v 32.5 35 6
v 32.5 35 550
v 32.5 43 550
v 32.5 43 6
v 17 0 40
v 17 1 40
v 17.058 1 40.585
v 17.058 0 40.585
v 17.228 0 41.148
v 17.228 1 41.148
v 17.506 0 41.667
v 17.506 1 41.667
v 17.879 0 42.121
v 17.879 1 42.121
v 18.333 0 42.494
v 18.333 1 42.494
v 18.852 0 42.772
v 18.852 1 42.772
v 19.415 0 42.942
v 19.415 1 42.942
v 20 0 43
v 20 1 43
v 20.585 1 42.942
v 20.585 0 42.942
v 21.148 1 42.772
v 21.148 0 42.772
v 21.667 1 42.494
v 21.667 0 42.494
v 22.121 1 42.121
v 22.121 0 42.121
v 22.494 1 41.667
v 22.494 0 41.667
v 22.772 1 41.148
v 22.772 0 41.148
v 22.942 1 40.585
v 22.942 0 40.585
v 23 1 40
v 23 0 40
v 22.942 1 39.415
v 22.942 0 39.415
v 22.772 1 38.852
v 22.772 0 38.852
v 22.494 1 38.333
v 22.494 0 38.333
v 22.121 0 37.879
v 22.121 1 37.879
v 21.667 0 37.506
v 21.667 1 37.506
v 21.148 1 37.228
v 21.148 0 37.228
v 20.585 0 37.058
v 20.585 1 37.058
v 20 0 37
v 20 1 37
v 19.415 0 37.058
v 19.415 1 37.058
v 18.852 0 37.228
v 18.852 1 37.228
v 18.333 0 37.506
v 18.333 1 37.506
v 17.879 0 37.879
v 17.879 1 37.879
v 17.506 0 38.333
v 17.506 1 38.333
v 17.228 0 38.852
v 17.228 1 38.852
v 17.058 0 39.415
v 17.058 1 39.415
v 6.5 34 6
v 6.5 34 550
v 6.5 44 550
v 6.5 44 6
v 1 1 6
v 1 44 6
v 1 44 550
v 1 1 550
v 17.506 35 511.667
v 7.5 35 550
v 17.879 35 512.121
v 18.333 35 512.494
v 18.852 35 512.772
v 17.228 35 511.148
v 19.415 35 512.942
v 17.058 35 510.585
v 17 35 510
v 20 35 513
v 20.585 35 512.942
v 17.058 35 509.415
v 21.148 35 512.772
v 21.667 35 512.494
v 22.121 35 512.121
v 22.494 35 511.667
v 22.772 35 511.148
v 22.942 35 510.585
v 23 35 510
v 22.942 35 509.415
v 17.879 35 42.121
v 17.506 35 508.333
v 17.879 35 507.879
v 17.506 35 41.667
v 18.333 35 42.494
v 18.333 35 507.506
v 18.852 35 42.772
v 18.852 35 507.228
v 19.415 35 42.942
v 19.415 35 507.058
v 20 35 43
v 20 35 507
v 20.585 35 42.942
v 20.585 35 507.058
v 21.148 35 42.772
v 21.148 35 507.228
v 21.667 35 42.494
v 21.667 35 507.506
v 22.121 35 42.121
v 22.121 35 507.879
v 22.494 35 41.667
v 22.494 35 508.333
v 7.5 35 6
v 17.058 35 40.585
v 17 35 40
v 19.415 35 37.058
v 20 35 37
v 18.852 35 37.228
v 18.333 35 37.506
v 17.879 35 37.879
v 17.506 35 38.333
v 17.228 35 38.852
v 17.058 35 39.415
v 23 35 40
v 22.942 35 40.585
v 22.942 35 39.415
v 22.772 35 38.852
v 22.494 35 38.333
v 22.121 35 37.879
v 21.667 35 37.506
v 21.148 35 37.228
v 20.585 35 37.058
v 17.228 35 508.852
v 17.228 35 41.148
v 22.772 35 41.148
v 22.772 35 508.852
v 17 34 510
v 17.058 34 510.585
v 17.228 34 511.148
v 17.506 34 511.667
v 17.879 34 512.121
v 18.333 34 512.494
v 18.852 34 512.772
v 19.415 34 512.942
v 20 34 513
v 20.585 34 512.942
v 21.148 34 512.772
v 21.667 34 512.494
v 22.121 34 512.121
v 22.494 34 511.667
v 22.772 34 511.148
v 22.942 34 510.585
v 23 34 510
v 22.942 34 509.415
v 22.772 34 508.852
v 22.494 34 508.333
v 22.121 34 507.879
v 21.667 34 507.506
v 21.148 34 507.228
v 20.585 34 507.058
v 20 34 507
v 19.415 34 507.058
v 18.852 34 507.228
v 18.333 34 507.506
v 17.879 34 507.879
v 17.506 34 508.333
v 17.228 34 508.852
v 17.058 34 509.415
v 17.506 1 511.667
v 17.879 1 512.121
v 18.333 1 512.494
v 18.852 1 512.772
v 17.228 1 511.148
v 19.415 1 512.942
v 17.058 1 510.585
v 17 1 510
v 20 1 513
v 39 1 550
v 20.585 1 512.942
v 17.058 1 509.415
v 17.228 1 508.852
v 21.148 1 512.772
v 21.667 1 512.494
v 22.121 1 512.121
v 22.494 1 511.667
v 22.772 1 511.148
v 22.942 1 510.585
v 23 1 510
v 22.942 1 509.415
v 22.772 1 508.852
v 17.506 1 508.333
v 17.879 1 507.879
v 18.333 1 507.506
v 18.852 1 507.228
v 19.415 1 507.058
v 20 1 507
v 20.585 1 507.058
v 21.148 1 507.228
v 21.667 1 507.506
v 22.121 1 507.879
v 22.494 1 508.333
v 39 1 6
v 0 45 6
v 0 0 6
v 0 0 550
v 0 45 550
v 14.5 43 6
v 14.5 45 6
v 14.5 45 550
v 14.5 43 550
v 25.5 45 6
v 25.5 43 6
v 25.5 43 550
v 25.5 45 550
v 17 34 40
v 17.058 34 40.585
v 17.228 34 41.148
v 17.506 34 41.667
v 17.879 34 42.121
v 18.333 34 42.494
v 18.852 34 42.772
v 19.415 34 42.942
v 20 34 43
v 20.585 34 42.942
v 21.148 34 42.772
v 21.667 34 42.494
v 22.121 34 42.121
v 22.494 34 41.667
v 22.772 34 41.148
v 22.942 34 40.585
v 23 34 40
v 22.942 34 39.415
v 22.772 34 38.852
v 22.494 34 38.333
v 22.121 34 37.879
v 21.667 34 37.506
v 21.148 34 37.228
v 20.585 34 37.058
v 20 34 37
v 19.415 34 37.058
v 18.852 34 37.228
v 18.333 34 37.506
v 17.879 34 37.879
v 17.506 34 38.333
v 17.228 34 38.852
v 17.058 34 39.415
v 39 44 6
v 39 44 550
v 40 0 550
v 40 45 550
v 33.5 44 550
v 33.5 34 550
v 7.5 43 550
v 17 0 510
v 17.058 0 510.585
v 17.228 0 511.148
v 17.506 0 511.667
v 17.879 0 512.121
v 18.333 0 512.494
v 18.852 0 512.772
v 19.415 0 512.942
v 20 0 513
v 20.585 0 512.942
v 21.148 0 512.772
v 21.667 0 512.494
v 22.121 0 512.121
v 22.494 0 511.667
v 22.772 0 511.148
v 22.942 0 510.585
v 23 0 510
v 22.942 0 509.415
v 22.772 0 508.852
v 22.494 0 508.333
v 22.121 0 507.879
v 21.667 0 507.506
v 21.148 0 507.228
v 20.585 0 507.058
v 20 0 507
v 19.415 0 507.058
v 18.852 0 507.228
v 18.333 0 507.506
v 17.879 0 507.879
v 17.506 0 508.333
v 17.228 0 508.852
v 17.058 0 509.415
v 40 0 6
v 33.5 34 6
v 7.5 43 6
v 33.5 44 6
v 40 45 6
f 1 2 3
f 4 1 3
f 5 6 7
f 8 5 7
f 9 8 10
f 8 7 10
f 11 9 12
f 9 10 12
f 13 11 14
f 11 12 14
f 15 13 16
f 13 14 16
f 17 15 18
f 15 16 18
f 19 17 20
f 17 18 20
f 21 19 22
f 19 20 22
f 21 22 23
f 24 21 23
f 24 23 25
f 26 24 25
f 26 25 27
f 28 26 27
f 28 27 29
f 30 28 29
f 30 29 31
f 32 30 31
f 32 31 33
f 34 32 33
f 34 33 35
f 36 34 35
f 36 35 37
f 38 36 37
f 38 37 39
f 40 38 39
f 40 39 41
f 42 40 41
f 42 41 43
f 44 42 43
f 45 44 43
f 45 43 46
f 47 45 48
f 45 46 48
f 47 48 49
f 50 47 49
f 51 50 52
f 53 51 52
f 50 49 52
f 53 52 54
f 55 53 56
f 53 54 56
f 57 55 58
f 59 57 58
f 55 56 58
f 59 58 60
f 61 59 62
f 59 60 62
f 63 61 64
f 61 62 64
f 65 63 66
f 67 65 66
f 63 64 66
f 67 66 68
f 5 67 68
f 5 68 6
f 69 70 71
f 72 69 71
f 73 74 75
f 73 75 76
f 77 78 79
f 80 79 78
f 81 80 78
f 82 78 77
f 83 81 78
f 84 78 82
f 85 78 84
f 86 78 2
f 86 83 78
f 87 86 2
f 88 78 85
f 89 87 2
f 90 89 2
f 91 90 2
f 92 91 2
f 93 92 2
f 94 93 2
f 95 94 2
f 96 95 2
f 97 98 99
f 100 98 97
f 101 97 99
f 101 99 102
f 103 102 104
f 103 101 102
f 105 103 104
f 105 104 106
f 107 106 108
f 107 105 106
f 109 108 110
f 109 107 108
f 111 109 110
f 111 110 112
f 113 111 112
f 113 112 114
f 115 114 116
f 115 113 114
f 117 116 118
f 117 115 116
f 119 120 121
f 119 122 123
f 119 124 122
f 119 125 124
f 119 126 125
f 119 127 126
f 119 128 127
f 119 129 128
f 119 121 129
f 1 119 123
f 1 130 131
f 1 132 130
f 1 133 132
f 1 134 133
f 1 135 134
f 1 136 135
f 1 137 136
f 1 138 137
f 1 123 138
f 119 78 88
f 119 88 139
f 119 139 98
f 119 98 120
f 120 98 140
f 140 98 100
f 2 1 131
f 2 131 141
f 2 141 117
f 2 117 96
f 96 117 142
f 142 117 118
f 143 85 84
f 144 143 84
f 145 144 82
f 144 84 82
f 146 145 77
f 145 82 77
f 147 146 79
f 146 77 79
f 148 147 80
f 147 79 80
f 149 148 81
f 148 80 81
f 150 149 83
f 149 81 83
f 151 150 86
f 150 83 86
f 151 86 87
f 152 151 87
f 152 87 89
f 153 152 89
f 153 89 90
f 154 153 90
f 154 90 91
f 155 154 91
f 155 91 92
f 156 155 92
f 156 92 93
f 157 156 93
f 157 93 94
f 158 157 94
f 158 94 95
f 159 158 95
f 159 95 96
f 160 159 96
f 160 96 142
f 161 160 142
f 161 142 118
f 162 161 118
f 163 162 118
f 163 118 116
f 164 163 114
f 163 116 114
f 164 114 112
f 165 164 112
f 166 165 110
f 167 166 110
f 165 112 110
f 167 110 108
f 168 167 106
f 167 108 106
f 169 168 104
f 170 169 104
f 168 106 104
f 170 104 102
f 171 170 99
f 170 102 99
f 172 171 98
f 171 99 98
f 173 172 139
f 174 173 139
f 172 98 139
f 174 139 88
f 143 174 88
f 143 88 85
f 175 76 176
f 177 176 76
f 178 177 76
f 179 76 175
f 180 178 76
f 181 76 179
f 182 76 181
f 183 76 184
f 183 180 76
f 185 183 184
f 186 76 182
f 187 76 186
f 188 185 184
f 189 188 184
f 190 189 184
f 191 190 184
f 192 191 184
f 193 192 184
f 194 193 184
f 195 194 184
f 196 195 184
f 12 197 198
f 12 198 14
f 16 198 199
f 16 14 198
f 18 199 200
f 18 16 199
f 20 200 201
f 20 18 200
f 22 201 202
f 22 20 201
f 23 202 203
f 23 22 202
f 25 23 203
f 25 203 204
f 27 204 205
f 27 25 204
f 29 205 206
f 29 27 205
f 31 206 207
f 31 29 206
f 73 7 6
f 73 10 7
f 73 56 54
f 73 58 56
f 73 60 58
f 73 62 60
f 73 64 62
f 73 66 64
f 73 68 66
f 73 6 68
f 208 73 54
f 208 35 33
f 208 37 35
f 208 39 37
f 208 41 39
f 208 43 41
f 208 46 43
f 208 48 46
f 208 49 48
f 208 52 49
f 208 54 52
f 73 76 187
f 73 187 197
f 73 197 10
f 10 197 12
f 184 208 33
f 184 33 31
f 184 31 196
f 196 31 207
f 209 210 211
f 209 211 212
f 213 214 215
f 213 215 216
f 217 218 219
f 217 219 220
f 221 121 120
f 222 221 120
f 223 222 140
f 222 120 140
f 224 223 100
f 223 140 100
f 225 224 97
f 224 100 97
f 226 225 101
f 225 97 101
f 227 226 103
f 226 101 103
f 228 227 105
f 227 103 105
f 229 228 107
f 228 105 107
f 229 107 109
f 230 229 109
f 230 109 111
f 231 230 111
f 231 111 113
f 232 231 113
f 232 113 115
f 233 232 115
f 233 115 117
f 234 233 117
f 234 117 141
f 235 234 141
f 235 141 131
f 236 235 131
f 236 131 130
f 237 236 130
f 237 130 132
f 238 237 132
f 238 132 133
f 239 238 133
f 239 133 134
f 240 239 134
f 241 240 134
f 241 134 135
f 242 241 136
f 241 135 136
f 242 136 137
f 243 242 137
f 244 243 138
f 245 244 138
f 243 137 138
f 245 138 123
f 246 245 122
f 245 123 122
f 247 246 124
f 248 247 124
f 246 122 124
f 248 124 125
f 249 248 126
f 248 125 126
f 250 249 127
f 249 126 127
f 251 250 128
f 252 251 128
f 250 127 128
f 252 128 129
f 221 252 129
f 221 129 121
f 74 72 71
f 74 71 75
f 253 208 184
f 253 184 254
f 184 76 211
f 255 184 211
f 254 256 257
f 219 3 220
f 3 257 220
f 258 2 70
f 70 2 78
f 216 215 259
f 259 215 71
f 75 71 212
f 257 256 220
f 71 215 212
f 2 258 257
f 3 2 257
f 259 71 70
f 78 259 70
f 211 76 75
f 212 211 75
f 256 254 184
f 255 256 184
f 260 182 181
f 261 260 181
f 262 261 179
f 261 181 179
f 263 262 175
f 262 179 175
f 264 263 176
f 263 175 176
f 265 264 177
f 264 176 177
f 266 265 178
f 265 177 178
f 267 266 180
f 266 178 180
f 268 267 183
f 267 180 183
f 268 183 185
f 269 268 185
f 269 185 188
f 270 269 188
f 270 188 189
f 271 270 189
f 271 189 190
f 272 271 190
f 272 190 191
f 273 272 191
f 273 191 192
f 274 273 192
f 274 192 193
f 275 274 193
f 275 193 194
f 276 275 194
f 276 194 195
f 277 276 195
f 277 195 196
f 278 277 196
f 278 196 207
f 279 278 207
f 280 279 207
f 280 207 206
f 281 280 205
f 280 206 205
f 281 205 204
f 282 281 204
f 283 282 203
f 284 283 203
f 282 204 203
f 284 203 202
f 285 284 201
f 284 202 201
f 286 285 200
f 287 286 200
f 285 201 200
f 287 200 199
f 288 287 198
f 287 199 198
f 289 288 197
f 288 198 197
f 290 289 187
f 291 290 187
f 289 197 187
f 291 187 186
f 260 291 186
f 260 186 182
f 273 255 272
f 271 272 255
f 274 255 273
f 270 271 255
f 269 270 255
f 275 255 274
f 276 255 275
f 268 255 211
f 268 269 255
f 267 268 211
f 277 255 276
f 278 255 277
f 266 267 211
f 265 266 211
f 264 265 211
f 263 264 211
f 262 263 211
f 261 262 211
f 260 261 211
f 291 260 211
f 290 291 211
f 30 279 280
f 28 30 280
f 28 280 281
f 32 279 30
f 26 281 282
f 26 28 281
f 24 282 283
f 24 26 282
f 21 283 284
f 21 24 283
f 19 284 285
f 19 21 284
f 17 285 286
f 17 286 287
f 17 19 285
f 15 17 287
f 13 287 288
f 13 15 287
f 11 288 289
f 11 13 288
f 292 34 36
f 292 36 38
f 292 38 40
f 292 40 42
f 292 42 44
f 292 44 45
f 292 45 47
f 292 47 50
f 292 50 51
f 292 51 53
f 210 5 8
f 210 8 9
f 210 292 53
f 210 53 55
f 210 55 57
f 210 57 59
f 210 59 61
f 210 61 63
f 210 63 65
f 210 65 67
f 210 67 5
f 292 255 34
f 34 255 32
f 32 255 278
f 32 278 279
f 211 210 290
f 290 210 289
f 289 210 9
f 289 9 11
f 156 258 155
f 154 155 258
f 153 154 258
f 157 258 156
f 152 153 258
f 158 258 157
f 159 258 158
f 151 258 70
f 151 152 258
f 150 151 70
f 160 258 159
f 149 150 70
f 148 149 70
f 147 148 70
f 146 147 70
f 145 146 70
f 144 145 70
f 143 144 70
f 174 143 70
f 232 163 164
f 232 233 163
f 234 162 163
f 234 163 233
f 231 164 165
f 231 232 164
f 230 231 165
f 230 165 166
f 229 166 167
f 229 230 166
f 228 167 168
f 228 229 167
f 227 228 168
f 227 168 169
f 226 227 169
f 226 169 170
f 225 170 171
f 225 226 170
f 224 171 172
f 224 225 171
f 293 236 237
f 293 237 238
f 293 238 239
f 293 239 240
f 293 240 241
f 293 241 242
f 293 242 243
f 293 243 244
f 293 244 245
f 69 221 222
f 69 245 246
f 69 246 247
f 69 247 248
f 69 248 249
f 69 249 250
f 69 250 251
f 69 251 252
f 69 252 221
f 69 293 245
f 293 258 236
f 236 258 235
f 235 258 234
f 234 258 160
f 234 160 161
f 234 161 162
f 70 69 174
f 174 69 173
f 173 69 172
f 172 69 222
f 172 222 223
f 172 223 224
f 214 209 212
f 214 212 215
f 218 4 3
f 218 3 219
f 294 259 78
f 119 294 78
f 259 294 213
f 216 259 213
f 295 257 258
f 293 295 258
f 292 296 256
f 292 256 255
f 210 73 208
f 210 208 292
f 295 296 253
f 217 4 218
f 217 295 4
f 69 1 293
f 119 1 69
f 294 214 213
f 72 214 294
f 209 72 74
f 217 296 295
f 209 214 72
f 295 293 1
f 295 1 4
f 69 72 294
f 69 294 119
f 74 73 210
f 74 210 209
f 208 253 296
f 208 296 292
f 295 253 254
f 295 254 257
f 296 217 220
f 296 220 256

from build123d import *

# Parameters (mm, degrees)
BOSS_EXTRUDE1_DEPTH = 550
SKETCH2_R           = 3
CUT_EXTRUDE2_DEPTH  = 200
SKETCH3_W           = 47.285738773
SKETCH3_H           = 54.700142613
CUT_EXTRUDE3_DEPTH  = 6


with BuildPart() as part:
    # Sketch1 → Boss-Extrude1 (new body)
    with BuildSketch(Plane.XY):
        Polygon((25.5, 43), (25.5, 45), (40, 45), (40, 0), (0, 0), (0, 45), (14.5, 45), (14.5, 43), (9.595309941, 43), (7.5, 43), (7.5, 35), (32.5, 35), (32.5, 43), align=None)
        Polygon((33.5, 44), (33.5, 34), (6.5, 34), (6.5, 44), (1, 44), (1, 1), (39, 1), (39, 44), align=None, mode=Mode.SUBTRACT)
    extrude(amount=BOSS_EXTRUDE1_DEPTH)

    # Sketch2 → Cut-Extrude2 (cut)
    with BuildSketch(Plane(origin=(0, 35, 0), x_dir=(1, 0, 0), z_dir=(0, 1, 0))):
        with Locations(Location((20, -40, 0), (0, 0, 180))):
            Circle(SKETCH2_R)
        with Locations(Location((20, -510, 0), (0, 0, 180))):
            Circle(SKETCH2_R)
    extrude(amount=-CUT_EXTRUDE2_DEPTH, mode=Mode.SUBTRACT)

    # Sketch3 → Cut-Extrude3 (cut)
    with BuildSketch(Plane(origin=(0, 0, 0), x_dir=(-1, 0, 0), z_dir=(0, 0, -1))):
        with Locations((-18.970719089, 19.421785252)):
            Rectangle(SKETCH3_W, SKETCH3_H)
    extrude(amount=-CUT_EXTRUDE3_DEPTH, mode=Mode.SUBTRACT)


solid = part.part
